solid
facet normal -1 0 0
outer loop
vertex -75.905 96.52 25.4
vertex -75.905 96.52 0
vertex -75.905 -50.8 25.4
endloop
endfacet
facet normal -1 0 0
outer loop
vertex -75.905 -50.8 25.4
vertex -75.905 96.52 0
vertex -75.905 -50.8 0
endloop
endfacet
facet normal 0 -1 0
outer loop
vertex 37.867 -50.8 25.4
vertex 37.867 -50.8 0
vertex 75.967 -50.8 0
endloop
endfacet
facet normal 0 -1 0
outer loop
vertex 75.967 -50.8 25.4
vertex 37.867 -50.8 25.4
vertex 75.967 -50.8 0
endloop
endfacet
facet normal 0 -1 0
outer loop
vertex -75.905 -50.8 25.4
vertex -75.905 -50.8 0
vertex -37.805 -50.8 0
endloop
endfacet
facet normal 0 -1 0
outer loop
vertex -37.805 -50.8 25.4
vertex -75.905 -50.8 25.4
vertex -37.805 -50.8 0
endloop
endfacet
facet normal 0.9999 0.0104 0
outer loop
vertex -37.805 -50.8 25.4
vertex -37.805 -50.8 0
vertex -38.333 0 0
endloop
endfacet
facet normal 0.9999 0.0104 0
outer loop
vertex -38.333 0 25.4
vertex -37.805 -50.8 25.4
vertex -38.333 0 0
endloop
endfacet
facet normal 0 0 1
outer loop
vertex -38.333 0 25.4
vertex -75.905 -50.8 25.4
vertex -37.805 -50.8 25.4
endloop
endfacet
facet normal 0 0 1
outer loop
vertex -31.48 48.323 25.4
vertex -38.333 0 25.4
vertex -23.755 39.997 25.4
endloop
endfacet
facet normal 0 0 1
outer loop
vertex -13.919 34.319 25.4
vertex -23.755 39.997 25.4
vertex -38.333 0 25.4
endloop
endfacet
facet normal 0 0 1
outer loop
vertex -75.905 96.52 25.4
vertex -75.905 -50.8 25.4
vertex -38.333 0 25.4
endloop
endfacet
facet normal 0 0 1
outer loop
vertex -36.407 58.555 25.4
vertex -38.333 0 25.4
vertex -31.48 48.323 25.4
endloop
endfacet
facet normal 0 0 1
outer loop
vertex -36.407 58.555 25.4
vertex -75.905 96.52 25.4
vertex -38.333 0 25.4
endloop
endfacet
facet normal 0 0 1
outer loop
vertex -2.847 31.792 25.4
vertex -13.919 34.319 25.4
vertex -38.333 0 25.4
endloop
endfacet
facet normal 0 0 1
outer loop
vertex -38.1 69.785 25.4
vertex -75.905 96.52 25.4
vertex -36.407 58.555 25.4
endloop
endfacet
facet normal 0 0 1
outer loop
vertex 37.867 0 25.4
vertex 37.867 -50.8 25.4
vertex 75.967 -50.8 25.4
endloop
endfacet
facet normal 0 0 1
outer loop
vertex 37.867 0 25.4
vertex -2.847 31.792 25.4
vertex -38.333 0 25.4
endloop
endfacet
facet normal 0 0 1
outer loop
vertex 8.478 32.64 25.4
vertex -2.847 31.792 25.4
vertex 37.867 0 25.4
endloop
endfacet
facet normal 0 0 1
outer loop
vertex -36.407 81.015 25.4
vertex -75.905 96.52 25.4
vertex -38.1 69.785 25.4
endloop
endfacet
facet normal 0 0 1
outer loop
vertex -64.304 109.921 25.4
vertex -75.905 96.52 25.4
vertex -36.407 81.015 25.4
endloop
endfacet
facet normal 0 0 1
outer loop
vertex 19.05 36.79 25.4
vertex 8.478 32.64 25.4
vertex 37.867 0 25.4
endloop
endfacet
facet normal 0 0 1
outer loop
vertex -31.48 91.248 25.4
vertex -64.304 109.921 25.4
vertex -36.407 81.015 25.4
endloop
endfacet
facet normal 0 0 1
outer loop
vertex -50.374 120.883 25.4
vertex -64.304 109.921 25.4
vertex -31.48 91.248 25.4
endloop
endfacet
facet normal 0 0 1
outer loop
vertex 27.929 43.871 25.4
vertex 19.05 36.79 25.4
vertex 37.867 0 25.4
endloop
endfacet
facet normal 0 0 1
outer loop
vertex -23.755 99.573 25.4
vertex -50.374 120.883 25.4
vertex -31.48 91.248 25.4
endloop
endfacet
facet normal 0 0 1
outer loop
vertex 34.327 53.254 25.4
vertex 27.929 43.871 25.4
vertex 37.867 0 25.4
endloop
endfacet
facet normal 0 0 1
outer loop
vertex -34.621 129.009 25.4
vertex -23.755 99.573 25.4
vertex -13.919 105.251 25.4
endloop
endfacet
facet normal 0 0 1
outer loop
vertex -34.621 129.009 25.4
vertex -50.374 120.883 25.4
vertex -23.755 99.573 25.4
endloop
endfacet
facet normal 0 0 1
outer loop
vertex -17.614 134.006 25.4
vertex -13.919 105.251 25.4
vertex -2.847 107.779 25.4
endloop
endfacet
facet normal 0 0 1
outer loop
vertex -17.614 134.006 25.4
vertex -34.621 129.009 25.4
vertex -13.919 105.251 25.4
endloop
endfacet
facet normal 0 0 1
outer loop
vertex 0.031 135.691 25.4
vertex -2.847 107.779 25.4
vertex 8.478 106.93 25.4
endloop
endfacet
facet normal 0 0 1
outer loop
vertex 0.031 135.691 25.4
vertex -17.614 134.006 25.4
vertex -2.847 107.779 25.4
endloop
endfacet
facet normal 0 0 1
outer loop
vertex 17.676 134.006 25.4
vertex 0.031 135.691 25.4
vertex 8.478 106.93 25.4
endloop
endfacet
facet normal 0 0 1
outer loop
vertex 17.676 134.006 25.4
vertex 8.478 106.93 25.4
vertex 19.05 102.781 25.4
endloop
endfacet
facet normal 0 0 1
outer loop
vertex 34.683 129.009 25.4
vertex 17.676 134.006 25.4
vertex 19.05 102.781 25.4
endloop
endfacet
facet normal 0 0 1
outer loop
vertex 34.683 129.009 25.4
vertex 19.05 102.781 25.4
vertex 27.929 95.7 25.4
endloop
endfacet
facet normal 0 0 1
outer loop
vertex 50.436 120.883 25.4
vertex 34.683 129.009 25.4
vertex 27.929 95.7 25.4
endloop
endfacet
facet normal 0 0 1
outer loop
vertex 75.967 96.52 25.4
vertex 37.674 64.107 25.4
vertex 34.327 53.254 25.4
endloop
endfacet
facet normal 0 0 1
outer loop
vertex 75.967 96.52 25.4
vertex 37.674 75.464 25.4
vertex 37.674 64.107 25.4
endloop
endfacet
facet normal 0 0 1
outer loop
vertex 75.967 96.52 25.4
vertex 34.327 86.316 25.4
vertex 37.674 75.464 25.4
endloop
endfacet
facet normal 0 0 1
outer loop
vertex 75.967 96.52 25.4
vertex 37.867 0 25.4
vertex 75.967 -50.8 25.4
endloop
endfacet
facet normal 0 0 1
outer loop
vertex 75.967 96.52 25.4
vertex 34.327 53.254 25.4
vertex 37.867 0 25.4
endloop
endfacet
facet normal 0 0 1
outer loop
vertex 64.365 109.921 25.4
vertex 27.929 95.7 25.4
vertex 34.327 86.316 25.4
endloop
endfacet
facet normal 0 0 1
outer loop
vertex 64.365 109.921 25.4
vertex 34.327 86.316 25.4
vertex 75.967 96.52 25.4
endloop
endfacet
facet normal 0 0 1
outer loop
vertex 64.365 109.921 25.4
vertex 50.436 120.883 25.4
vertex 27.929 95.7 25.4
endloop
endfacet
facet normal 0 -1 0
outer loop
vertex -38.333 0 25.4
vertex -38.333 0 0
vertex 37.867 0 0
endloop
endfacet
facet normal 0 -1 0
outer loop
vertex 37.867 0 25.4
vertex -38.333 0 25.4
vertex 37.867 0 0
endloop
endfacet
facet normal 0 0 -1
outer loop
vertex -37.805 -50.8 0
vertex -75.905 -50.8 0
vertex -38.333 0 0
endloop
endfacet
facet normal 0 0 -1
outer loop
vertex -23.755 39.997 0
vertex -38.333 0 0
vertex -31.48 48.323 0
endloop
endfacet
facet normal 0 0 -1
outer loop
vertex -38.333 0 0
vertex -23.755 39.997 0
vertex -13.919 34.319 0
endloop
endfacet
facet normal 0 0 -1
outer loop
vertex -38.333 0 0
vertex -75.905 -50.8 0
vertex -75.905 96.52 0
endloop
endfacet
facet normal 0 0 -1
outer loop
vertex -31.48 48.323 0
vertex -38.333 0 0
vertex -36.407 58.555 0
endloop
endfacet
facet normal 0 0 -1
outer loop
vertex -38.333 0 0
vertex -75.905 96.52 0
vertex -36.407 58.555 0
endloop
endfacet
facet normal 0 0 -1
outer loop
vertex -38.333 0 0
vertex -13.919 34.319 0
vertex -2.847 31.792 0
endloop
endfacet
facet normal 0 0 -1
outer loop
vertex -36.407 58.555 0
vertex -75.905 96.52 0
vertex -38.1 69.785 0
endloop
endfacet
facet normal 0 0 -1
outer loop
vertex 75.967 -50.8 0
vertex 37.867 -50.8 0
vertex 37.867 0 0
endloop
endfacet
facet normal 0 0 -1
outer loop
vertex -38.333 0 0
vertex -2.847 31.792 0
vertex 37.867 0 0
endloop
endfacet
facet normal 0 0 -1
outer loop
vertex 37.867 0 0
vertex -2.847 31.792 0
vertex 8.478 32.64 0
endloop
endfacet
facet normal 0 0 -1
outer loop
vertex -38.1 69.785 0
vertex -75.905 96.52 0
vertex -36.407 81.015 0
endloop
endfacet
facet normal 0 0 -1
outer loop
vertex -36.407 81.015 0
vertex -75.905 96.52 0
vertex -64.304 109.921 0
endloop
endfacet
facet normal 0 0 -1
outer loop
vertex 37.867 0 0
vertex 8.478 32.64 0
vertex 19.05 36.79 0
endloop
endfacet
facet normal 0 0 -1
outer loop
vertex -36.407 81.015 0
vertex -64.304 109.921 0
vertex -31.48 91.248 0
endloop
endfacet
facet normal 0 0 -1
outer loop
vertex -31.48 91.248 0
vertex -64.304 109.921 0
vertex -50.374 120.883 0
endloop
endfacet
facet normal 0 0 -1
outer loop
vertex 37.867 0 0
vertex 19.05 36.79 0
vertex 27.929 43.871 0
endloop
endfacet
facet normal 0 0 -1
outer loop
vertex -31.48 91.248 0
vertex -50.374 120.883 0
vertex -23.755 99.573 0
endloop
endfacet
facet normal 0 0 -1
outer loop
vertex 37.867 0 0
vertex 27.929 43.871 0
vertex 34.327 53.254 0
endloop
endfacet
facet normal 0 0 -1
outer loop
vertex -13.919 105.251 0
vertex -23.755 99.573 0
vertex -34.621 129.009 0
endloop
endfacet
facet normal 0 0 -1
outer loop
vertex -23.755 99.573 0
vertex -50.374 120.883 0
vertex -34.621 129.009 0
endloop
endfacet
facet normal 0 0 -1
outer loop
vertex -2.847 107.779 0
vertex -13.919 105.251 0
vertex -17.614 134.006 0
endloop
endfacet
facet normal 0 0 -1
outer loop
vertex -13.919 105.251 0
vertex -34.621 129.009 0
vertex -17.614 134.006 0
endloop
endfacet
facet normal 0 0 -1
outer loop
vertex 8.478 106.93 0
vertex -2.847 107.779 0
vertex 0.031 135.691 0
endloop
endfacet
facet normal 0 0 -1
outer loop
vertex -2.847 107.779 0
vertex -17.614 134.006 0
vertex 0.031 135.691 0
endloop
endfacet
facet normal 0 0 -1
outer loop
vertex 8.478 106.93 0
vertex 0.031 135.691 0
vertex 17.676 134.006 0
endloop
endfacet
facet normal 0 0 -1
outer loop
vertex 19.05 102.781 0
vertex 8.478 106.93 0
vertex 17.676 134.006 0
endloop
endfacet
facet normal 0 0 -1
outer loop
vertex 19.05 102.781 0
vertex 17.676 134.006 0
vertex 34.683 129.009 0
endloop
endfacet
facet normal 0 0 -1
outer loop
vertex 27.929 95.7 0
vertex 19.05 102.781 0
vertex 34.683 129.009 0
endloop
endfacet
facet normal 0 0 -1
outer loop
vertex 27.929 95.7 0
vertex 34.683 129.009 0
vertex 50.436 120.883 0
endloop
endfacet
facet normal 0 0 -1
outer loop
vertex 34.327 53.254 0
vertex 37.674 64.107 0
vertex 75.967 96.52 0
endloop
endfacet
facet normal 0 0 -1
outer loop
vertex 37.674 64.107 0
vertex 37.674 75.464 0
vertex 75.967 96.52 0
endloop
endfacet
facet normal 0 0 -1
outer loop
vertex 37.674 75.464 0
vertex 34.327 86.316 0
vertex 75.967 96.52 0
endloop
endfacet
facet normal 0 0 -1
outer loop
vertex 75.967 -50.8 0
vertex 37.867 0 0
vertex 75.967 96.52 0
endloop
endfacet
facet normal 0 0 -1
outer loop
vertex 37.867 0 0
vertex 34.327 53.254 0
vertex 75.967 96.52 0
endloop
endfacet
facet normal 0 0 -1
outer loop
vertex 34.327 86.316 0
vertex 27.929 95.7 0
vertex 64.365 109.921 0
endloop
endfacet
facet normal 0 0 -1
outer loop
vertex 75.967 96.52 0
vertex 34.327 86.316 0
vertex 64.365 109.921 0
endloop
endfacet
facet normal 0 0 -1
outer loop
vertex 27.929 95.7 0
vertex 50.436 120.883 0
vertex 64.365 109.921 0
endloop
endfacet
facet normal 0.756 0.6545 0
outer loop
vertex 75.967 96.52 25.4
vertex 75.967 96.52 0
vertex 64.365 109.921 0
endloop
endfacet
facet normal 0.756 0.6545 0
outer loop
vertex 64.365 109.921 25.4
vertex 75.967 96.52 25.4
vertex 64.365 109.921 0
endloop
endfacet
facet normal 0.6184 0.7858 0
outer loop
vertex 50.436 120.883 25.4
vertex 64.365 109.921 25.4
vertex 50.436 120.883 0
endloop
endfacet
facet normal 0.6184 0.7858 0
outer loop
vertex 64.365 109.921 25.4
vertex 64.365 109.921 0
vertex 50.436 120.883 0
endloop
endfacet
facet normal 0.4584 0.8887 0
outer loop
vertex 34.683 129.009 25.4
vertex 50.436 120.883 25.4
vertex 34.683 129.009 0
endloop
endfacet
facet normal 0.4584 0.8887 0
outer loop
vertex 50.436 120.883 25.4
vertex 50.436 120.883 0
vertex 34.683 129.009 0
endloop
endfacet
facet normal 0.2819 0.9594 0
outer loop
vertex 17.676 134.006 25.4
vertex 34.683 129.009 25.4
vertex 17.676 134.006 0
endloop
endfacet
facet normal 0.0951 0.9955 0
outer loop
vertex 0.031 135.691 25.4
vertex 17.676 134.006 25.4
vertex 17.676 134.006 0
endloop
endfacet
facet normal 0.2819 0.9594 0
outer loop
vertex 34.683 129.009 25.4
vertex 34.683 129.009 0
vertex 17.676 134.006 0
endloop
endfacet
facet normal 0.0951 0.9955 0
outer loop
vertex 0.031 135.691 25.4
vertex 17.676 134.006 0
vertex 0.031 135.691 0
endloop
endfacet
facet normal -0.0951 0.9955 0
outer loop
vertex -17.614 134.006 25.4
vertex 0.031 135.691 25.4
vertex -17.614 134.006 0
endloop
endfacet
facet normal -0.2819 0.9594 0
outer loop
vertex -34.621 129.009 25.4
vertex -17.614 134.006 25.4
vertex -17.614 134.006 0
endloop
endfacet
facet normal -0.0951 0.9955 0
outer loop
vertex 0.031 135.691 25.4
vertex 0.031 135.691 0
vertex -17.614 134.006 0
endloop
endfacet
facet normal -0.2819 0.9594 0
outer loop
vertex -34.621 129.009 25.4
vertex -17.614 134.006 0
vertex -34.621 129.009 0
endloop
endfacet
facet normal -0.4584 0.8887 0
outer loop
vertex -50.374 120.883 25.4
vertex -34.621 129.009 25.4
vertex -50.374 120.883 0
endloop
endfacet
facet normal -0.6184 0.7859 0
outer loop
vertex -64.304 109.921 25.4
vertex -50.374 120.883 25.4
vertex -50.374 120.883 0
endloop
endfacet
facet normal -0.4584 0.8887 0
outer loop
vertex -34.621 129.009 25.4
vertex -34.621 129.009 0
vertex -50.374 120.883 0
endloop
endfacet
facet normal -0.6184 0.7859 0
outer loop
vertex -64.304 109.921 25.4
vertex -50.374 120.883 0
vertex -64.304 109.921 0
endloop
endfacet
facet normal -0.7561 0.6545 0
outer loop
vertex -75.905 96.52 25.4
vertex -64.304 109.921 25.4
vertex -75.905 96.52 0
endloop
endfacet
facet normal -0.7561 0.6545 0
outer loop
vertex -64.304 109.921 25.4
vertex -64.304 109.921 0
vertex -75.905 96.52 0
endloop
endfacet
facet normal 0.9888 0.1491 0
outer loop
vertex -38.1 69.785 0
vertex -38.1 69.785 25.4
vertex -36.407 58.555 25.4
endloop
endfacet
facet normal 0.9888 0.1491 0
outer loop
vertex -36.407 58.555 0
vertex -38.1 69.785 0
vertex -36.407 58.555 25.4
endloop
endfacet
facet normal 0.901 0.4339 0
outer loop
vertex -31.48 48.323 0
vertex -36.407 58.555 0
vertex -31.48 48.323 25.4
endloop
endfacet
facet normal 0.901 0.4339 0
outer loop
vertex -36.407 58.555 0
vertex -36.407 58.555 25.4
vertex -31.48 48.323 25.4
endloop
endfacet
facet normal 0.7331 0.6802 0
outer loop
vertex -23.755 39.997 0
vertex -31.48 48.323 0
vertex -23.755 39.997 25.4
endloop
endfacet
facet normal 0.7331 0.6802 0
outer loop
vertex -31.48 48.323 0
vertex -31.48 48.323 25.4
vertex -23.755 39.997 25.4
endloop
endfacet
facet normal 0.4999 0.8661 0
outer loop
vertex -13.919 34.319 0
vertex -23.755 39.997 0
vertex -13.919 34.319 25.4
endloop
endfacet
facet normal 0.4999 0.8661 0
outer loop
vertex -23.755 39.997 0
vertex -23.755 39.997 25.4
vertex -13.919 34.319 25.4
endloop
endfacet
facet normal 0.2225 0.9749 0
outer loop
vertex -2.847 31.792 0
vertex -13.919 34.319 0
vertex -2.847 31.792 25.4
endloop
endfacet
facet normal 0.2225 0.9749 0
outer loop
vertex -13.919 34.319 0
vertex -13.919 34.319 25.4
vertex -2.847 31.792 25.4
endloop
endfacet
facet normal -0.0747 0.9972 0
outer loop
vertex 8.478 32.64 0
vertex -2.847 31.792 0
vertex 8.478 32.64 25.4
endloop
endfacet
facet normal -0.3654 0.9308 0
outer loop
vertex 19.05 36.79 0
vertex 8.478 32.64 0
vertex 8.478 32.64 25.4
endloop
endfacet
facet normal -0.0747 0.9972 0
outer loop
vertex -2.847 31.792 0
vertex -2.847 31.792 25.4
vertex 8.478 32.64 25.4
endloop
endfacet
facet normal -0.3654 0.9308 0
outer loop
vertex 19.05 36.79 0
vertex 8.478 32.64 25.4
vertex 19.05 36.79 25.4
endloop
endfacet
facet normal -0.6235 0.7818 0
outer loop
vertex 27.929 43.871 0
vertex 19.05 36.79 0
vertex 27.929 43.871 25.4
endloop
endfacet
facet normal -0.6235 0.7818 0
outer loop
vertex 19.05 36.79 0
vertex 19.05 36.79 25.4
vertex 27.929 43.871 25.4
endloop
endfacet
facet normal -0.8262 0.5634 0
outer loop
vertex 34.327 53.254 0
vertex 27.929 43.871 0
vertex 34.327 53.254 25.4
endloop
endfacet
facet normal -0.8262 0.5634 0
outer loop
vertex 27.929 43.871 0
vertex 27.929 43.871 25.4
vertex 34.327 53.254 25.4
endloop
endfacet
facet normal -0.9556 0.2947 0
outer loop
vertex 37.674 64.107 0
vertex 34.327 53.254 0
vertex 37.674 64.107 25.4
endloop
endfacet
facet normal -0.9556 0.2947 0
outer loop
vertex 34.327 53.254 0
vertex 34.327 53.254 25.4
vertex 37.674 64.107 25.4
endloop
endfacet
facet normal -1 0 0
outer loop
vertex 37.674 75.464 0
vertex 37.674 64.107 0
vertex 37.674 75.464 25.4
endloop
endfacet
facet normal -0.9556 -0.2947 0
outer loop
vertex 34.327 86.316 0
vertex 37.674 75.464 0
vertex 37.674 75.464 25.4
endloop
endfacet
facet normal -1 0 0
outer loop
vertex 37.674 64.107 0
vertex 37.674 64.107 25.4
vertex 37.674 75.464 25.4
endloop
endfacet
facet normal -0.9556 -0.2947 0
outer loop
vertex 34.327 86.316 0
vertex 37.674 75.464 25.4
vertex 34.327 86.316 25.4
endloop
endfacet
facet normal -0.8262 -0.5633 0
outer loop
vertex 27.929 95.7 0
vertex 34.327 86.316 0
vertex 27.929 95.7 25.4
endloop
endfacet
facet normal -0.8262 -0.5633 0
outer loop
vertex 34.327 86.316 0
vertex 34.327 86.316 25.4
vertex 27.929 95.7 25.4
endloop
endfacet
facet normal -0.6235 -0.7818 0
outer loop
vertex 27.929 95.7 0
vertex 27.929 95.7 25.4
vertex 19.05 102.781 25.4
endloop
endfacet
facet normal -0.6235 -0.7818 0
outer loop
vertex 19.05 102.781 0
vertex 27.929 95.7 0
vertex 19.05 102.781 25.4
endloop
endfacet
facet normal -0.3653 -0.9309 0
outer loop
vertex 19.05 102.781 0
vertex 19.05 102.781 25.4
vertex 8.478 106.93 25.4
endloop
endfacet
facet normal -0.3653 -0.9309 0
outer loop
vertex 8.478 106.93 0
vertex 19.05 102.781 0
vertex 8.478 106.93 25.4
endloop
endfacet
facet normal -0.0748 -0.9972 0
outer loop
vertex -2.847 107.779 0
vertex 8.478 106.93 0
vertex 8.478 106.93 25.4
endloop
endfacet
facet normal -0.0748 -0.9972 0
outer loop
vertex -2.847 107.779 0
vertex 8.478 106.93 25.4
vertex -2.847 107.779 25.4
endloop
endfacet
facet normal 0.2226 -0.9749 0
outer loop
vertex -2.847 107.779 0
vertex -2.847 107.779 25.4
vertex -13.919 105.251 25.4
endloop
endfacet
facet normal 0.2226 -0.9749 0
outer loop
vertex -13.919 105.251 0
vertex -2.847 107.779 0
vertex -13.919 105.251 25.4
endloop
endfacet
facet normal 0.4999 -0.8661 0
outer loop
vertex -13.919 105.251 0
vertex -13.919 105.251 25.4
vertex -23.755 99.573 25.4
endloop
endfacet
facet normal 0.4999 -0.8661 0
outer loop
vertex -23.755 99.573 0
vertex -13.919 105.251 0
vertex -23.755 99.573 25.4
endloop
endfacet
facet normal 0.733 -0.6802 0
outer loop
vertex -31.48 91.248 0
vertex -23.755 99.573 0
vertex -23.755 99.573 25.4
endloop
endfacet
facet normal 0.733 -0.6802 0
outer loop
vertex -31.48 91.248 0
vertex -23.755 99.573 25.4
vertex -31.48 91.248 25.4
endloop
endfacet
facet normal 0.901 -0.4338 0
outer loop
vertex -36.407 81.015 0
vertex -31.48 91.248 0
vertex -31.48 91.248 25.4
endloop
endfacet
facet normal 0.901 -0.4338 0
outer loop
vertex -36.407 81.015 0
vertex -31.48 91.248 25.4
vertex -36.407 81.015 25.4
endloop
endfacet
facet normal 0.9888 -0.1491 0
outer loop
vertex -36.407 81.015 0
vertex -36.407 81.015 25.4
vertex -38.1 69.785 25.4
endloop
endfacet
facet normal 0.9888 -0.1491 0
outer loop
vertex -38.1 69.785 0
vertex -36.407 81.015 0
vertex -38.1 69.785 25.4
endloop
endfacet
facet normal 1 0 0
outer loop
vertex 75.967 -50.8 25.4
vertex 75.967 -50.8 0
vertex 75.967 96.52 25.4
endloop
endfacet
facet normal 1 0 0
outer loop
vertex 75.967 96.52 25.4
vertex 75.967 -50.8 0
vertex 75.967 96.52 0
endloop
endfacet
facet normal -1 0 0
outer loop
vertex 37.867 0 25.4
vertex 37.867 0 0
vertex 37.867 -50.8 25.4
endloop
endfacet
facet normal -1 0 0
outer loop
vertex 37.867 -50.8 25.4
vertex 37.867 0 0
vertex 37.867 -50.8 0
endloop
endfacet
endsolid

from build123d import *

# Parameters (mm, degrees)
F1_DEPTH = 25.4
F3_D     = 76.2


with BuildPart() as f1:
    # F0 (on Top) → F1 (new body)
    with BuildSketch(Plane.XY):
        with BuildLine():
            Line((-37.8053453803, -50.8), (-38.3331997294, 0))
            Line((-38.3331997294, 0), (37.8668002706, 0))
            Line((37.8668002706, 0), (37.8668002706, -50.8))
            Line((37.8668002706, -50.8), (75.9668002706, -50.8))
            Line((75.9668002706, -50.8), (75.9668002706, 0))
            Line((75.9668002706, 0), (75.9668002706, 96.52))
            ThreePointArc((75.9668002706, 96.52), (0.0307274451, 135.6912791975), (-75.9053453803, 96.52))
            Line((-75.9053453803, 96.52), (-75.9053453803, 0))
            Line((-75.9053453803, 0), (-75.9053453803, -50.8))
            Line((-75.9053453803, -50.8), (-37.8053453803, -50.8))
        make_face()
    extrude(amount=F1_DEPTH)

    # F3 (through all)
    with Locations(Plane(origin=(0, 0, 0), x_dir=(1, 0, 0), z_dir=(0, 0, -1))):
        with Locations((0, -69.78520751)):
            Hole(F3_D / 2)


solid = f1.part
